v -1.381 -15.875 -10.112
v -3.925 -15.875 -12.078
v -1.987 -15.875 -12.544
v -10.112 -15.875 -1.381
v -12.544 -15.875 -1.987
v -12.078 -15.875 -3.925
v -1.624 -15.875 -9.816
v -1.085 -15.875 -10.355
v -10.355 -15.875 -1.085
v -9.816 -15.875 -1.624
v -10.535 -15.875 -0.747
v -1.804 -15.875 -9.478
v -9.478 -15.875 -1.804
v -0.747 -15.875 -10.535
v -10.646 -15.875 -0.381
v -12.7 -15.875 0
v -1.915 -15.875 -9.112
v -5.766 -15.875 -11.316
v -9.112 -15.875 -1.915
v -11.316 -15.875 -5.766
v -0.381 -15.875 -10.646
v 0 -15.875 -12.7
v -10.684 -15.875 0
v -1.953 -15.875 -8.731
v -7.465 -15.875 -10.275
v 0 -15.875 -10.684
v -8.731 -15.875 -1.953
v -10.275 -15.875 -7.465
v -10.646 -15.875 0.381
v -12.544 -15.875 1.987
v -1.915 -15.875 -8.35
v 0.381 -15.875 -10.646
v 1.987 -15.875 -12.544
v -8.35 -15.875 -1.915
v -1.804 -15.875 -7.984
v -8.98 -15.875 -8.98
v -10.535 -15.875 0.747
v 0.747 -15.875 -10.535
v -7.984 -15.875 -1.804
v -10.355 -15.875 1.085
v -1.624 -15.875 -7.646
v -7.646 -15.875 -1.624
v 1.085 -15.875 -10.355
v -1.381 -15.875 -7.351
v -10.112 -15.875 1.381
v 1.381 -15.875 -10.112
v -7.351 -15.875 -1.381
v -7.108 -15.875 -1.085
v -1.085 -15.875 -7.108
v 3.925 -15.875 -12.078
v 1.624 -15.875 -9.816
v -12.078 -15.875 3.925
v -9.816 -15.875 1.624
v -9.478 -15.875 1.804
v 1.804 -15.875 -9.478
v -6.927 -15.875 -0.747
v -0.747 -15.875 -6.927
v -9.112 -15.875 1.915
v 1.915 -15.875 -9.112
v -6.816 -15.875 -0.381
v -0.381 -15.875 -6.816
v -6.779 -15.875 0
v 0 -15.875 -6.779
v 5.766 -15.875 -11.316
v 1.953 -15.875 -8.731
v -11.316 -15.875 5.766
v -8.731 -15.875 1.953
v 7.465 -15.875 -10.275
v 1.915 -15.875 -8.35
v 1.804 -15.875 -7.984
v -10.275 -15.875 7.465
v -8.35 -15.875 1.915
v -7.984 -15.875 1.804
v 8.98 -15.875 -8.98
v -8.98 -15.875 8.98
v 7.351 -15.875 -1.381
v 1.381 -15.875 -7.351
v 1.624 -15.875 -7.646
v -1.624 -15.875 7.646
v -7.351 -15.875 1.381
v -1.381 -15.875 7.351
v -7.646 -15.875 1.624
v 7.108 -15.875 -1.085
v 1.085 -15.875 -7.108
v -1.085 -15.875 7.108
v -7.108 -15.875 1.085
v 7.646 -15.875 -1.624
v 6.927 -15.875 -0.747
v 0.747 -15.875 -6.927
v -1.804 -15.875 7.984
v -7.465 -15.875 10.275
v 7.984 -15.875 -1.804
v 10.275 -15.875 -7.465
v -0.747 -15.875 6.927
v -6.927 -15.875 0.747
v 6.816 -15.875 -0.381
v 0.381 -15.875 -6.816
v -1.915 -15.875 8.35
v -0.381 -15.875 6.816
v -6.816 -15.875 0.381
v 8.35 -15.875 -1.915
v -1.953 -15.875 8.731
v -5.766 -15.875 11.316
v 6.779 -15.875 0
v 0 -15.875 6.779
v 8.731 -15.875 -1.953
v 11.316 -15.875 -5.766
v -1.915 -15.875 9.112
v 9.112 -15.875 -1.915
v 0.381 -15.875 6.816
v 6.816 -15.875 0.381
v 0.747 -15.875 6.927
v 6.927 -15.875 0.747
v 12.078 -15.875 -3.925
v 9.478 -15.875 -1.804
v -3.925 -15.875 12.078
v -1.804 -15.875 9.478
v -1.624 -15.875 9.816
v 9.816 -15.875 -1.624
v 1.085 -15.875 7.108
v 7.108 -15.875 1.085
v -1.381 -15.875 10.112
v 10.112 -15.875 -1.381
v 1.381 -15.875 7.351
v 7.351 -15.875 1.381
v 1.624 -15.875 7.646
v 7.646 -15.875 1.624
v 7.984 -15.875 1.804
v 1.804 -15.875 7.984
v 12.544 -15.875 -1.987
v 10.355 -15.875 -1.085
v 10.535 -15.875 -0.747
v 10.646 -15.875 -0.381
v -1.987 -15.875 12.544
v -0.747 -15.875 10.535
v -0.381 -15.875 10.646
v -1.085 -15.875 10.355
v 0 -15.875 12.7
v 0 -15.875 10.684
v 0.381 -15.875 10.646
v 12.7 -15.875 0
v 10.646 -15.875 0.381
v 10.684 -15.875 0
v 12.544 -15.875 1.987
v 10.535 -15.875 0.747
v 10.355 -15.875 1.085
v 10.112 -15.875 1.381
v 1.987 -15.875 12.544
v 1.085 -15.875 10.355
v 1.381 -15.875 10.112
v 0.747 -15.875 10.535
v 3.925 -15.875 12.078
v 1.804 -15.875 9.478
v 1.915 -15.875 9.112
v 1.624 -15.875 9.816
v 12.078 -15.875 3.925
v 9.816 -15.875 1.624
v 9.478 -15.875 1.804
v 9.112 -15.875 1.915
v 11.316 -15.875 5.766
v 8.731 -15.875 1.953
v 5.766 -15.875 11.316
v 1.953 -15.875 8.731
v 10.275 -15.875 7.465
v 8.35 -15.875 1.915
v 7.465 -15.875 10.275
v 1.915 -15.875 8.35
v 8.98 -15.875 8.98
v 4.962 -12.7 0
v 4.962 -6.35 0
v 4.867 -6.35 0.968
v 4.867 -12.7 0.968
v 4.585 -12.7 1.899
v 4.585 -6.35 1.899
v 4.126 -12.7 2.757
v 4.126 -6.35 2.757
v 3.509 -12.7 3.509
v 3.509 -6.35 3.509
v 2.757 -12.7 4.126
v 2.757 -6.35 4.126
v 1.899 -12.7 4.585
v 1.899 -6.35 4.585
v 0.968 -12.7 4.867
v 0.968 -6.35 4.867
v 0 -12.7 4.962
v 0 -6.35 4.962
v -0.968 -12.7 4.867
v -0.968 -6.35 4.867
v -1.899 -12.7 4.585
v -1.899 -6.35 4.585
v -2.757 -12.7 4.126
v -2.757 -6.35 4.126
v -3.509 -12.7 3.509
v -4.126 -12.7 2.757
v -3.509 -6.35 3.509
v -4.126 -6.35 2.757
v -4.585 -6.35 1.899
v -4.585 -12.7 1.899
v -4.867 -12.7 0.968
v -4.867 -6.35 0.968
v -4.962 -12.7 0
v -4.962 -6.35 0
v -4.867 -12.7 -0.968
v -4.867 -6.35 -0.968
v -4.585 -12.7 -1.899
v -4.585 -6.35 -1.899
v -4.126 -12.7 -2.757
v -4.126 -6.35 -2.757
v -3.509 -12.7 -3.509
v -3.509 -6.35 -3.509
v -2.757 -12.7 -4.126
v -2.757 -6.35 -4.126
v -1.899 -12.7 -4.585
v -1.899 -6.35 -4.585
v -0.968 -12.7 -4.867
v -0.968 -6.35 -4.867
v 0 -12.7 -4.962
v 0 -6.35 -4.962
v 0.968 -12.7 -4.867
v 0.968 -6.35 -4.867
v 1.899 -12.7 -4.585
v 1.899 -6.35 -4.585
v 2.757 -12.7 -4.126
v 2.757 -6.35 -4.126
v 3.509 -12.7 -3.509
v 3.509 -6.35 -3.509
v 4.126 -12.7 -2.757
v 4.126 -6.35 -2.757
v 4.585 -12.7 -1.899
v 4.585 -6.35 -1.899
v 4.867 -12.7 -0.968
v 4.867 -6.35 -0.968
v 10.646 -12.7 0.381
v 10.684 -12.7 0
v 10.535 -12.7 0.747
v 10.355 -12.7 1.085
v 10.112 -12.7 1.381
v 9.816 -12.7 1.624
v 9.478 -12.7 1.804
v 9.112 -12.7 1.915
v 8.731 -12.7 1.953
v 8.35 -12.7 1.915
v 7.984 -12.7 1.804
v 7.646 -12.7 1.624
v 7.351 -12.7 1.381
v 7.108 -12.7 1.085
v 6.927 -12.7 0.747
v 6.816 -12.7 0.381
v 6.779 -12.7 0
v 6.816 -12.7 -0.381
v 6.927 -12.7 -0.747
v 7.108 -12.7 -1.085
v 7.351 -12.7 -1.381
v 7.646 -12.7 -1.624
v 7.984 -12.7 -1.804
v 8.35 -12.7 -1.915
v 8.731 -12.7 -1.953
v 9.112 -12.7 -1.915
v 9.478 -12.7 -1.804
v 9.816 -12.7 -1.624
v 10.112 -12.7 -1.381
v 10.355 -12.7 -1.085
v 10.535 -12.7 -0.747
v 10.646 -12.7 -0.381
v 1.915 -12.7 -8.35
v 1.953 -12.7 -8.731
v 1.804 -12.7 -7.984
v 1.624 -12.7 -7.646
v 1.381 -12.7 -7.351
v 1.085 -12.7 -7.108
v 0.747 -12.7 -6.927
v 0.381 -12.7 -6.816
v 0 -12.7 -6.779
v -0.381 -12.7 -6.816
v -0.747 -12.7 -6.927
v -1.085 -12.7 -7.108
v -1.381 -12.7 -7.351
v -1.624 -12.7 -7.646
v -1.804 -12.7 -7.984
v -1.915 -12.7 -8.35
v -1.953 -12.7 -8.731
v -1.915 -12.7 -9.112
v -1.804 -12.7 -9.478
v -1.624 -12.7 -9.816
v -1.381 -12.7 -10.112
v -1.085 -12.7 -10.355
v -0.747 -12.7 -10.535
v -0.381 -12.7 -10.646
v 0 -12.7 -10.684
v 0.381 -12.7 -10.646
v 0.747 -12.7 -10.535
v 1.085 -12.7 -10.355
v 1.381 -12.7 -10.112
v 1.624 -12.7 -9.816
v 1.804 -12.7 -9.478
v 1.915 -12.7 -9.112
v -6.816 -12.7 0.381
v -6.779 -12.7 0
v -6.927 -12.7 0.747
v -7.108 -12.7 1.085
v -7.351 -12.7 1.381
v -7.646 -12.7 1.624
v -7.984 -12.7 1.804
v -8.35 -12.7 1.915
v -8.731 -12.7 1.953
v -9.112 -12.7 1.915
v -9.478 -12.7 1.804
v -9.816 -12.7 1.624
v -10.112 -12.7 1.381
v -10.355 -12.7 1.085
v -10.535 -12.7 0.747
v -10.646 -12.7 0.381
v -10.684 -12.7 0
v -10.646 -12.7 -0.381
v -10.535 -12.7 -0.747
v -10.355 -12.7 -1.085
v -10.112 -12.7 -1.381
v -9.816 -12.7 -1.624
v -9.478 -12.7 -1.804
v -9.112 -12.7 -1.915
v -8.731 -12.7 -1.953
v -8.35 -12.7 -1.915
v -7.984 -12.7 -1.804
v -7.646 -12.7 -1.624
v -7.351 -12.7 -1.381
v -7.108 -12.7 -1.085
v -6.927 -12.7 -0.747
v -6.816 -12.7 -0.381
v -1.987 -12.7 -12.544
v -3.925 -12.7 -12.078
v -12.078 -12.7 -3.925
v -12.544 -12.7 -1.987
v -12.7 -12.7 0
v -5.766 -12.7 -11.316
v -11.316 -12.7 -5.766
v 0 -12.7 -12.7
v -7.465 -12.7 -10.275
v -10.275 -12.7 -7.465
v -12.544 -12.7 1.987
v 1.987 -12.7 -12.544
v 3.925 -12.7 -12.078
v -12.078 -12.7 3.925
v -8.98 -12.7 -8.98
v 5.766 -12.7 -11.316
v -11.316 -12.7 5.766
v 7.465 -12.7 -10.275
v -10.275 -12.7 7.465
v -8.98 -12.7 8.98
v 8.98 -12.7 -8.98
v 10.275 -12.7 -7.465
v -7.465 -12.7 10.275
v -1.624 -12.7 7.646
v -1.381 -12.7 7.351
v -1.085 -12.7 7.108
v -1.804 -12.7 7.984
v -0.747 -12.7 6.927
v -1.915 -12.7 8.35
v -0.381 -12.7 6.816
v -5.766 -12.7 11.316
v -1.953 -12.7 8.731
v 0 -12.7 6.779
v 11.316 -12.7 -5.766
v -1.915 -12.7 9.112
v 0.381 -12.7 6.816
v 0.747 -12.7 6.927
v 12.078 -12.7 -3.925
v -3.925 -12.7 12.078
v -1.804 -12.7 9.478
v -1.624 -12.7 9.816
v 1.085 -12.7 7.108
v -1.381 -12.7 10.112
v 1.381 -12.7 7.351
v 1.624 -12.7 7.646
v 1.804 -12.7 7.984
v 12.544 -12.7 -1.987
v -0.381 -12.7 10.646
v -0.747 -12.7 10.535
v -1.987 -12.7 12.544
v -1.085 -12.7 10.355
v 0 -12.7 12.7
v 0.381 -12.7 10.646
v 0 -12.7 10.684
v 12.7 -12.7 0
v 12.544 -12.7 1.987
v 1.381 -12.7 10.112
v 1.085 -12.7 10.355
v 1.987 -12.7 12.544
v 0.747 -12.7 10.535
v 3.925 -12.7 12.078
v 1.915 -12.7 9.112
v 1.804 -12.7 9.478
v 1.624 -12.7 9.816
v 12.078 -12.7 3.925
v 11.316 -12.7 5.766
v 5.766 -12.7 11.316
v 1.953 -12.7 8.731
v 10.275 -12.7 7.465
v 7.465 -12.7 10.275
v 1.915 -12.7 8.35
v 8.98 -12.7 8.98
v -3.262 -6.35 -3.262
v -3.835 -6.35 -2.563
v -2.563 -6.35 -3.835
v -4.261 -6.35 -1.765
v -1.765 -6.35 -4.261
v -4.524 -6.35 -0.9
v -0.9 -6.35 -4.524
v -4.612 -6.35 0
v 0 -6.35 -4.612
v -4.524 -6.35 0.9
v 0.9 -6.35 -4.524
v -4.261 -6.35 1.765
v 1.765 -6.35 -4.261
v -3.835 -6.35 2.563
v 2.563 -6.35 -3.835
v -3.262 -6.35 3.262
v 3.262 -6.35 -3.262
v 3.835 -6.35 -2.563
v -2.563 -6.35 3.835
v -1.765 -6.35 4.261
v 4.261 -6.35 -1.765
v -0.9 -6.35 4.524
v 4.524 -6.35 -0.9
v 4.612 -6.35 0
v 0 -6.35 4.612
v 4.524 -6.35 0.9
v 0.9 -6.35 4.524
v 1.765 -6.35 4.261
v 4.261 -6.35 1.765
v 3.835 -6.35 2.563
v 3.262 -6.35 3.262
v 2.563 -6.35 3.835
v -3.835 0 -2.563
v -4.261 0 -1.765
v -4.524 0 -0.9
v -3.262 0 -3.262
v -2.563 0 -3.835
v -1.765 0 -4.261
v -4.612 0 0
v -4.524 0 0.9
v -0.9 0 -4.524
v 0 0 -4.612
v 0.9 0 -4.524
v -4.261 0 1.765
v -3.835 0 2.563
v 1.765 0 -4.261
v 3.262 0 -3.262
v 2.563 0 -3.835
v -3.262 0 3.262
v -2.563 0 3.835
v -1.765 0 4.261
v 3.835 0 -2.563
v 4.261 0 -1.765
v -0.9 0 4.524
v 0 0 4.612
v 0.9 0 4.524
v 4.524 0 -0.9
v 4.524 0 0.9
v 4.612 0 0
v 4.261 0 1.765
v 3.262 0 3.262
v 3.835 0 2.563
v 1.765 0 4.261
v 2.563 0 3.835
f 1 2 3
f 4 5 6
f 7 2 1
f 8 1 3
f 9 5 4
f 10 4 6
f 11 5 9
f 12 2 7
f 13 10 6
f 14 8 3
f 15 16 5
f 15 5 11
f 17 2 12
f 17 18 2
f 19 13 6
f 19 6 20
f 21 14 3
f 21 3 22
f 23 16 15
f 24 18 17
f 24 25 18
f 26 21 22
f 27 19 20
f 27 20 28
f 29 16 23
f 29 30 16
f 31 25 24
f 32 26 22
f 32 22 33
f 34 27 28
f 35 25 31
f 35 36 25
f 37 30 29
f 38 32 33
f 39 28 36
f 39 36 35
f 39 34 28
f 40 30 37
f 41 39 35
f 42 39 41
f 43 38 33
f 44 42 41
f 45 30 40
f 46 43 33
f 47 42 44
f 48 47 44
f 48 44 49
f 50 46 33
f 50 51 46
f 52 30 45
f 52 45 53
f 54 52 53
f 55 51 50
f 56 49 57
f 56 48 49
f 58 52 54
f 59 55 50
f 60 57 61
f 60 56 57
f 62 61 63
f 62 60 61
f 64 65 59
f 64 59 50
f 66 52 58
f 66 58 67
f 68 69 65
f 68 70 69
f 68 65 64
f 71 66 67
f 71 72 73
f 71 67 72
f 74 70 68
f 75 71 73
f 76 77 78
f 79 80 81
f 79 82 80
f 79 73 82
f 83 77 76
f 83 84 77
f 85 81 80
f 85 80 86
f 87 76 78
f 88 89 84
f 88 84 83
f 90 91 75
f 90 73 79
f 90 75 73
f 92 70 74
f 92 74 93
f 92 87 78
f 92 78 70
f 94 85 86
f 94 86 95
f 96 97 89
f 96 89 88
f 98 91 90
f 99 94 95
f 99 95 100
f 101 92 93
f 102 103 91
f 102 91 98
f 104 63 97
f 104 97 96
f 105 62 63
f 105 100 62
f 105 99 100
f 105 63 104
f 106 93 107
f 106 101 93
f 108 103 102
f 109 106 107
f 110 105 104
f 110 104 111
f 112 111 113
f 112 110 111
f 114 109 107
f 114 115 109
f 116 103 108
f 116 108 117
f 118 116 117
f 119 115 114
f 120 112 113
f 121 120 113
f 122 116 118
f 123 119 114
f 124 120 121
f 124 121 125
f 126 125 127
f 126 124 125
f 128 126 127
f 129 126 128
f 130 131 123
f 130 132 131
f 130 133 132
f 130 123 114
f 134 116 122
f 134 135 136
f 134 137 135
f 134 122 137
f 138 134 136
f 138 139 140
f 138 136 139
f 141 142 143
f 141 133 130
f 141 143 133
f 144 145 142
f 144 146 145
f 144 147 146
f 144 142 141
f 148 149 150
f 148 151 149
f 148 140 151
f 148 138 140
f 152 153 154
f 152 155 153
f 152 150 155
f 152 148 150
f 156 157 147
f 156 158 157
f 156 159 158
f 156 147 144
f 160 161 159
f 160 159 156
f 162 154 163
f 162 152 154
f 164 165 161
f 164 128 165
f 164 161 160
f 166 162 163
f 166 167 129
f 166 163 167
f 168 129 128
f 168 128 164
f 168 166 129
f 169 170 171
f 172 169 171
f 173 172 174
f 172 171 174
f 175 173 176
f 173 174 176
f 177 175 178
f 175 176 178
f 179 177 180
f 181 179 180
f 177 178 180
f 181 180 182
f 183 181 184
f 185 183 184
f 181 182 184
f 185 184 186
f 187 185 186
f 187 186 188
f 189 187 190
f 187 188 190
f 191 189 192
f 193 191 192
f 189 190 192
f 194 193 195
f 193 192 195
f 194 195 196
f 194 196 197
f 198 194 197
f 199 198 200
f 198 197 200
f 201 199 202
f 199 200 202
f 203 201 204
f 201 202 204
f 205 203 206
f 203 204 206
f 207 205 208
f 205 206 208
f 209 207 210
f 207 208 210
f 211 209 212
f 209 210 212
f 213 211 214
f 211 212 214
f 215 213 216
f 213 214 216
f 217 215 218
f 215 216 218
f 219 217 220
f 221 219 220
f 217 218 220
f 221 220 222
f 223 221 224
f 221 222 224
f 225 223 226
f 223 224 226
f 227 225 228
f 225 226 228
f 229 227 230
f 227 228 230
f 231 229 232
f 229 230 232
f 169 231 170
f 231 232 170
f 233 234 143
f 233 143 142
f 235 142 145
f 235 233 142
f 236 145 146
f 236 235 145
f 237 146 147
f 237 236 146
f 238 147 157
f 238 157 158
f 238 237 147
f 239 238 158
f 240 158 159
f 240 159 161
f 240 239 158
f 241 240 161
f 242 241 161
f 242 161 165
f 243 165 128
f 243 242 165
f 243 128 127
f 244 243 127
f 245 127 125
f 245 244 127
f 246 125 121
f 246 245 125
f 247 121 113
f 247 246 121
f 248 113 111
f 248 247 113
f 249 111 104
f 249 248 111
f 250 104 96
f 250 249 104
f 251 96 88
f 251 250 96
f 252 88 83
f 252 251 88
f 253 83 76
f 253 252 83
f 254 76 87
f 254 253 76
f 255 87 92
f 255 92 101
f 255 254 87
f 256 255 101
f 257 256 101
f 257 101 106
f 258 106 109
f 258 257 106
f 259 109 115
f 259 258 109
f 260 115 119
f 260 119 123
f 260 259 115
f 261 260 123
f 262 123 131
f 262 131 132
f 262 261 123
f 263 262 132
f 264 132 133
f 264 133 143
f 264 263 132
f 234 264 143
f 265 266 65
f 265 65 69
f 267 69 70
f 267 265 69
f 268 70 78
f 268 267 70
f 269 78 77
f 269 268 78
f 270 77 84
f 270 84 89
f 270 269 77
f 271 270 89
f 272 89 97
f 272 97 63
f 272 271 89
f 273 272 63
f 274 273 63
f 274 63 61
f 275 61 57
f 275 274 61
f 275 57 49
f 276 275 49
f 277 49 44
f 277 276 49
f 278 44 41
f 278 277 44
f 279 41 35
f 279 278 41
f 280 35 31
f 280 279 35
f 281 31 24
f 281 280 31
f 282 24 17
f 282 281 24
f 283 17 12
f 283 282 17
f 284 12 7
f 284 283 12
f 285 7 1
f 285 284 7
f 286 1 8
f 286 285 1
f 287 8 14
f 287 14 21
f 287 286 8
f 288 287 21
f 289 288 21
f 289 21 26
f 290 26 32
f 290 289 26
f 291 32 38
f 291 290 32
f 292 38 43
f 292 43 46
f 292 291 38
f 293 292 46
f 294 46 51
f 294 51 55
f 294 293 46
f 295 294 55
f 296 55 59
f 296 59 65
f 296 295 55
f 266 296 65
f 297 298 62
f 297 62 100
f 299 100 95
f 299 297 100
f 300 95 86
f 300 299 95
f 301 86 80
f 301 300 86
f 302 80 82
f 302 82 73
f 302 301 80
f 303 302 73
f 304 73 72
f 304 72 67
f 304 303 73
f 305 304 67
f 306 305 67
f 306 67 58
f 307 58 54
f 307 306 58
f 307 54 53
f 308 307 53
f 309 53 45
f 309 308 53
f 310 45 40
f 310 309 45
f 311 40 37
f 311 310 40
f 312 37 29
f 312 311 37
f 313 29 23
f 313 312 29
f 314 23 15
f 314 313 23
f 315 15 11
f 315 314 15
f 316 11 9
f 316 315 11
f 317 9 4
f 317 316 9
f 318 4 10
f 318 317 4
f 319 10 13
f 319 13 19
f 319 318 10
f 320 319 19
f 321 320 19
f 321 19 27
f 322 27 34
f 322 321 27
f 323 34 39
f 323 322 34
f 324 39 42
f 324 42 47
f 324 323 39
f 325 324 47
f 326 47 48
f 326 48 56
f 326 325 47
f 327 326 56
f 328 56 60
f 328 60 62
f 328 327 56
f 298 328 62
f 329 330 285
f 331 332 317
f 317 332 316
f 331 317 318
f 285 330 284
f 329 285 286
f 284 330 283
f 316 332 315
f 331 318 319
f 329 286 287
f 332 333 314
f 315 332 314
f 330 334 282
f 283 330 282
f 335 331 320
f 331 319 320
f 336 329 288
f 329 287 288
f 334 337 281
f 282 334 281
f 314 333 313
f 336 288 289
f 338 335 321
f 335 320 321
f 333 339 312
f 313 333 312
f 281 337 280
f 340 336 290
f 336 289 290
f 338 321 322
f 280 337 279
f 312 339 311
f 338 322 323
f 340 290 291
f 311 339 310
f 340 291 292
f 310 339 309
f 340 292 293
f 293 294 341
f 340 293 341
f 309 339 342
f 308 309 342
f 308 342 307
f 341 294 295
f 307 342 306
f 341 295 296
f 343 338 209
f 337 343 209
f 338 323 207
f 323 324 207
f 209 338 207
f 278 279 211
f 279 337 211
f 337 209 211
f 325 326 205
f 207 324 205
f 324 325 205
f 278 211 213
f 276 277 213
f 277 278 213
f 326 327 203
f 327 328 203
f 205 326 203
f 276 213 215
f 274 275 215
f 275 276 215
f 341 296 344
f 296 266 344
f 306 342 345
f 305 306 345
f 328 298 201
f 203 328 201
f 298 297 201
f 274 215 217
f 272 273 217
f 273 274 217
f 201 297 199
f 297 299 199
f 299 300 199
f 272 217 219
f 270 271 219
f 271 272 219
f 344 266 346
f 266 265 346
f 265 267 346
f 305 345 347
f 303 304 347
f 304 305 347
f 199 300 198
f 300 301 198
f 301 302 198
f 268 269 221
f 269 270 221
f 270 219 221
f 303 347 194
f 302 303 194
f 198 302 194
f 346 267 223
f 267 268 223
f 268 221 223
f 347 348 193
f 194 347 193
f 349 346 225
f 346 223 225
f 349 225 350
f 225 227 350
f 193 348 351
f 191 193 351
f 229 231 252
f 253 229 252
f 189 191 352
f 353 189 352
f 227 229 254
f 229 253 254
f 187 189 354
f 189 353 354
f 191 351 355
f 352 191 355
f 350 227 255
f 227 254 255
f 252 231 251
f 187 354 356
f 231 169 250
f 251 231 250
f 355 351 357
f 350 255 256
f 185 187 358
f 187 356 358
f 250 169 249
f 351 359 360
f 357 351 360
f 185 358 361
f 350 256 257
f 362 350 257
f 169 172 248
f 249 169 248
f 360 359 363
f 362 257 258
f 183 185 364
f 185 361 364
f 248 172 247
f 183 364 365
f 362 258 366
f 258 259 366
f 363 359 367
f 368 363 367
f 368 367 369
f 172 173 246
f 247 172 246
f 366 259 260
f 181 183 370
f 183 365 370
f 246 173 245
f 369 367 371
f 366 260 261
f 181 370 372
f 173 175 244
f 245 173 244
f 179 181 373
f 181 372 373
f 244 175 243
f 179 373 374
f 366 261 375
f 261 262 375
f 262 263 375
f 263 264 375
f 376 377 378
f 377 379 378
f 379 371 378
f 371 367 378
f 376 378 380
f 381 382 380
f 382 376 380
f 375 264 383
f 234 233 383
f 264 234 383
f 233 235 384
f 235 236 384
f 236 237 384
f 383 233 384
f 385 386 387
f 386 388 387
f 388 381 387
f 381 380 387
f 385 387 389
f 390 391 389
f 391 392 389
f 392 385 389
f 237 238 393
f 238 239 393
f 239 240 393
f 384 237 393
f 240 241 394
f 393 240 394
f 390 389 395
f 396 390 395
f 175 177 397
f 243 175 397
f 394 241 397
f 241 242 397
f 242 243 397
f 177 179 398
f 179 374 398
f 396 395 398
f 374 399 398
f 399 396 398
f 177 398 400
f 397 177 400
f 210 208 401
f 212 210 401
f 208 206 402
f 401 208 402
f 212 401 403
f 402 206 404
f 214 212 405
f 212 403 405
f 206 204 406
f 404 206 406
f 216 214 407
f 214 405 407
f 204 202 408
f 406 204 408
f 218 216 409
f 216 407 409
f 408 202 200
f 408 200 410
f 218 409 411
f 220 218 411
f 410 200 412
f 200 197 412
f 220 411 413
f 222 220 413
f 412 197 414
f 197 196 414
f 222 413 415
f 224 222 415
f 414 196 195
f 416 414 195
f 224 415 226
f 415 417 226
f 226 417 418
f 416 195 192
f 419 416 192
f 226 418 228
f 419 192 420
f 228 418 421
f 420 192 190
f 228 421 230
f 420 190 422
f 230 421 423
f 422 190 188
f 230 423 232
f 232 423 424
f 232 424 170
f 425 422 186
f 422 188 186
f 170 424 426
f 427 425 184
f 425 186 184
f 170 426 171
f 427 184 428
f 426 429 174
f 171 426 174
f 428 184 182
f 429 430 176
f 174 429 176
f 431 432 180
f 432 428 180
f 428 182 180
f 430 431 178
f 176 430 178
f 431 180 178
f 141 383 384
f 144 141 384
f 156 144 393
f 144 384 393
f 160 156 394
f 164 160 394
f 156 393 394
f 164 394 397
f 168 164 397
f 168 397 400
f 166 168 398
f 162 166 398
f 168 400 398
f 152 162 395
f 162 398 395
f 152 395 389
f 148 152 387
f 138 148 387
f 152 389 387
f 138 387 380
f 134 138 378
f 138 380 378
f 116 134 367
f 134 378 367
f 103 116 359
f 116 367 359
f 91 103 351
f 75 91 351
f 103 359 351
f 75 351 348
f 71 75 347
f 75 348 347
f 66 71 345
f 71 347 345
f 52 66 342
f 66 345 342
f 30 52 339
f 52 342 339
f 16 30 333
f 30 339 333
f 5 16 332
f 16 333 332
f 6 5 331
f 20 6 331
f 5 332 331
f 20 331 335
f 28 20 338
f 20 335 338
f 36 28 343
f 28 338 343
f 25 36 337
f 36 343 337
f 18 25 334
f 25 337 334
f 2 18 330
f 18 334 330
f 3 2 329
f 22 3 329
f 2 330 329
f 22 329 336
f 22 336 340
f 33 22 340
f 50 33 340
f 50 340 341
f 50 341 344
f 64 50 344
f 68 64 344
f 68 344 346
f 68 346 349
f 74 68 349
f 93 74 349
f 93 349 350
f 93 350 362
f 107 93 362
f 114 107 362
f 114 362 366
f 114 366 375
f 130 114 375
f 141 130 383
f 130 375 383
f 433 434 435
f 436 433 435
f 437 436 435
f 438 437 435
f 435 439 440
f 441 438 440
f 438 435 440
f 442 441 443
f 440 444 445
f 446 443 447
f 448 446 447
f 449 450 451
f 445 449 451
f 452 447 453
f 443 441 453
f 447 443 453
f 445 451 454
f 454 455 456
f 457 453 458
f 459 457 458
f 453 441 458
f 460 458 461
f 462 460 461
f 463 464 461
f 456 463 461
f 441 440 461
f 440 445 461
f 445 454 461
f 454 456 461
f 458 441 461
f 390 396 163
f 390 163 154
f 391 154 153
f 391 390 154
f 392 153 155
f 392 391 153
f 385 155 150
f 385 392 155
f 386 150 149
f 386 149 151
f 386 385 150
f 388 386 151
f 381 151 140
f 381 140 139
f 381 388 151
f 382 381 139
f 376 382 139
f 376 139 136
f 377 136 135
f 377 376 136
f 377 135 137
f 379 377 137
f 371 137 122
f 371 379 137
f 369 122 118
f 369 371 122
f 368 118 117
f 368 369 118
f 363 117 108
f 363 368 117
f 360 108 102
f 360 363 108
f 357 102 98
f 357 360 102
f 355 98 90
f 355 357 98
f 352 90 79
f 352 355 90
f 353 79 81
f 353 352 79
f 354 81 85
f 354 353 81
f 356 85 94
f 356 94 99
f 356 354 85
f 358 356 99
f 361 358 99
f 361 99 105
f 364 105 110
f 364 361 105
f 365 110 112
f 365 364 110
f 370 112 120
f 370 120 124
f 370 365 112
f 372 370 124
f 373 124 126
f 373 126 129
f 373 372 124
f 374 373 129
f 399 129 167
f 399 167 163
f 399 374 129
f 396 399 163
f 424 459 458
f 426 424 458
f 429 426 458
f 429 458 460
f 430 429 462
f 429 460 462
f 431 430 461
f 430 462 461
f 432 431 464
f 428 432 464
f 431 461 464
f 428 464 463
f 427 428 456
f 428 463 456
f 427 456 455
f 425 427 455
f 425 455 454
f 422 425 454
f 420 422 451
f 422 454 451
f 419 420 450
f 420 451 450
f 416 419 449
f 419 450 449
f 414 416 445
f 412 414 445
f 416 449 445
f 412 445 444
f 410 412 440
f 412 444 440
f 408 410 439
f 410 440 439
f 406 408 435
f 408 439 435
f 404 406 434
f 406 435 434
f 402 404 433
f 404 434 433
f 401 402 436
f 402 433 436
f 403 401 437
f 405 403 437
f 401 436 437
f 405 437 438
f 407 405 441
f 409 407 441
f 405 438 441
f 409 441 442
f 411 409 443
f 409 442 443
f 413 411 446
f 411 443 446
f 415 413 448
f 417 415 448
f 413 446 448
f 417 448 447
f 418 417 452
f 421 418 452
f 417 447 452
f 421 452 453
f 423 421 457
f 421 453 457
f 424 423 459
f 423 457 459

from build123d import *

# Parameters (mm, degrees)
F0_R     = 4.6125
F1_DEPTH = 6.35
F2_R     = 4.9625
F3_DEPTH = 6.35
F4_R     = 12.7
F4_R_2   = 1.9526
F5_DEPTH = 3.175


# Not quite as in the source:
# - a length typed as a fraction of an inch, garbled in the dataset ("3 / 203.2 mm" for 3/8 in), is restored


with BuildPart() as f1:
    # F0 (on Front) → F1 (new body)
    with BuildSketch(Plane.XZ):
        Circle(F0_R)
    extrude(amount=F1_DEPTH)

    # F2 (on face) → F3 (join)
    with BuildSketch(Plane.XZ.offset(6.35)):
        Circle(F2_R)
    extrude(amount=F3_DEPTH)

    # F4 (on face) → F5 (join)
    with BuildSketch(Plane.XZ.offset(12.7)):
        Circle(F4_R)
        with Locations((0, -8.73125)):
            Circle(F4_R_2, mode=Mode.SUBTRACT)
        with Locations((-8.73125, 0)):
            Circle(F4_R_2, mode=Mode.SUBTRACT)
        with Locations((8.73125, 0)):
            Circle(F4_R_2, mode=Mode.SUBTRACT)
        with Locations((0, 8.73125)):
            Circle(F4_R_2, mode=Mode.SUBTRACT)
    extrude(amount=F5_DEPTH)


solid = f1.part
